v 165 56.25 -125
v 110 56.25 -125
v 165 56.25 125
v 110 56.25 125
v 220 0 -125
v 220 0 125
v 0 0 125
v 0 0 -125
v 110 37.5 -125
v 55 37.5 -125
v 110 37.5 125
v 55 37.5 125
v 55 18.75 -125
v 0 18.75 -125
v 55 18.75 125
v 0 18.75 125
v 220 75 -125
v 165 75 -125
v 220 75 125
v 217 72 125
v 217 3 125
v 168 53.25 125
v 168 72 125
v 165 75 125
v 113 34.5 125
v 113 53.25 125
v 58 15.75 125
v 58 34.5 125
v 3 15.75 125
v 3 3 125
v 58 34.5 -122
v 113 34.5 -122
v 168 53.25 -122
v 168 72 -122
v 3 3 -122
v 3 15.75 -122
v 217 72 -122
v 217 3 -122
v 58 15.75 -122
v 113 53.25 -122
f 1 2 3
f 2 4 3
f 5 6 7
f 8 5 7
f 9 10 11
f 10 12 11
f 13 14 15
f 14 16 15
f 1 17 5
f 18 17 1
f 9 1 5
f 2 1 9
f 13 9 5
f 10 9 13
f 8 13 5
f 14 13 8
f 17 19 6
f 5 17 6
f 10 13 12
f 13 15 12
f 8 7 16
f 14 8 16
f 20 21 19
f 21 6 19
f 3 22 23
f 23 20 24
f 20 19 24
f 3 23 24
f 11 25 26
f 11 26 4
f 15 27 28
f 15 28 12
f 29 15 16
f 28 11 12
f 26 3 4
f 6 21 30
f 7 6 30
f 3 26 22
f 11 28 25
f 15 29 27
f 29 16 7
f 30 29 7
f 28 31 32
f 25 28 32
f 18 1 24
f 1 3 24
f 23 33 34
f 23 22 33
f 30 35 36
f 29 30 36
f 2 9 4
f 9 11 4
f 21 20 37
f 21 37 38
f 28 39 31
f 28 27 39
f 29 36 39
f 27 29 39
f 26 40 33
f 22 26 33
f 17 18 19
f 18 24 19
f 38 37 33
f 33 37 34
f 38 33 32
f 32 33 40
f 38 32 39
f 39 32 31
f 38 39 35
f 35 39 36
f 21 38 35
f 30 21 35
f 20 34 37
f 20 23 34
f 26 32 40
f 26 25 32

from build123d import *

# Parameters (mm, degrees)
BOSS_EXTRUDE1_DEPTH = 125
SHELL1_T            = -3


with BuildPart() as part:
    # Sketch1 → Boss-Extrude1 (new, symmetric)
    with BuildSketch(Plane.XY):
        Polygon((0, 0), (0, 18.75), (55, 18.75), (55, 37.5), (110, 37.5), (110, 56.25), (165, 56.25), (165, 75), (220, 75), (220, 0), align=None)
    extrude(amount=BOSS_EXTRUDE1_DEPTH, both=True)

    # Shell1
    shell1_openings = [part.faces().sort_by_distance(p)[0] for p in [
        (137.5, 28.125, 125),
    ]]
    offset(amount=SHELL1_T, openings=shell1_openings, kind=Kind.INTERSECTION)


solid = part.part
